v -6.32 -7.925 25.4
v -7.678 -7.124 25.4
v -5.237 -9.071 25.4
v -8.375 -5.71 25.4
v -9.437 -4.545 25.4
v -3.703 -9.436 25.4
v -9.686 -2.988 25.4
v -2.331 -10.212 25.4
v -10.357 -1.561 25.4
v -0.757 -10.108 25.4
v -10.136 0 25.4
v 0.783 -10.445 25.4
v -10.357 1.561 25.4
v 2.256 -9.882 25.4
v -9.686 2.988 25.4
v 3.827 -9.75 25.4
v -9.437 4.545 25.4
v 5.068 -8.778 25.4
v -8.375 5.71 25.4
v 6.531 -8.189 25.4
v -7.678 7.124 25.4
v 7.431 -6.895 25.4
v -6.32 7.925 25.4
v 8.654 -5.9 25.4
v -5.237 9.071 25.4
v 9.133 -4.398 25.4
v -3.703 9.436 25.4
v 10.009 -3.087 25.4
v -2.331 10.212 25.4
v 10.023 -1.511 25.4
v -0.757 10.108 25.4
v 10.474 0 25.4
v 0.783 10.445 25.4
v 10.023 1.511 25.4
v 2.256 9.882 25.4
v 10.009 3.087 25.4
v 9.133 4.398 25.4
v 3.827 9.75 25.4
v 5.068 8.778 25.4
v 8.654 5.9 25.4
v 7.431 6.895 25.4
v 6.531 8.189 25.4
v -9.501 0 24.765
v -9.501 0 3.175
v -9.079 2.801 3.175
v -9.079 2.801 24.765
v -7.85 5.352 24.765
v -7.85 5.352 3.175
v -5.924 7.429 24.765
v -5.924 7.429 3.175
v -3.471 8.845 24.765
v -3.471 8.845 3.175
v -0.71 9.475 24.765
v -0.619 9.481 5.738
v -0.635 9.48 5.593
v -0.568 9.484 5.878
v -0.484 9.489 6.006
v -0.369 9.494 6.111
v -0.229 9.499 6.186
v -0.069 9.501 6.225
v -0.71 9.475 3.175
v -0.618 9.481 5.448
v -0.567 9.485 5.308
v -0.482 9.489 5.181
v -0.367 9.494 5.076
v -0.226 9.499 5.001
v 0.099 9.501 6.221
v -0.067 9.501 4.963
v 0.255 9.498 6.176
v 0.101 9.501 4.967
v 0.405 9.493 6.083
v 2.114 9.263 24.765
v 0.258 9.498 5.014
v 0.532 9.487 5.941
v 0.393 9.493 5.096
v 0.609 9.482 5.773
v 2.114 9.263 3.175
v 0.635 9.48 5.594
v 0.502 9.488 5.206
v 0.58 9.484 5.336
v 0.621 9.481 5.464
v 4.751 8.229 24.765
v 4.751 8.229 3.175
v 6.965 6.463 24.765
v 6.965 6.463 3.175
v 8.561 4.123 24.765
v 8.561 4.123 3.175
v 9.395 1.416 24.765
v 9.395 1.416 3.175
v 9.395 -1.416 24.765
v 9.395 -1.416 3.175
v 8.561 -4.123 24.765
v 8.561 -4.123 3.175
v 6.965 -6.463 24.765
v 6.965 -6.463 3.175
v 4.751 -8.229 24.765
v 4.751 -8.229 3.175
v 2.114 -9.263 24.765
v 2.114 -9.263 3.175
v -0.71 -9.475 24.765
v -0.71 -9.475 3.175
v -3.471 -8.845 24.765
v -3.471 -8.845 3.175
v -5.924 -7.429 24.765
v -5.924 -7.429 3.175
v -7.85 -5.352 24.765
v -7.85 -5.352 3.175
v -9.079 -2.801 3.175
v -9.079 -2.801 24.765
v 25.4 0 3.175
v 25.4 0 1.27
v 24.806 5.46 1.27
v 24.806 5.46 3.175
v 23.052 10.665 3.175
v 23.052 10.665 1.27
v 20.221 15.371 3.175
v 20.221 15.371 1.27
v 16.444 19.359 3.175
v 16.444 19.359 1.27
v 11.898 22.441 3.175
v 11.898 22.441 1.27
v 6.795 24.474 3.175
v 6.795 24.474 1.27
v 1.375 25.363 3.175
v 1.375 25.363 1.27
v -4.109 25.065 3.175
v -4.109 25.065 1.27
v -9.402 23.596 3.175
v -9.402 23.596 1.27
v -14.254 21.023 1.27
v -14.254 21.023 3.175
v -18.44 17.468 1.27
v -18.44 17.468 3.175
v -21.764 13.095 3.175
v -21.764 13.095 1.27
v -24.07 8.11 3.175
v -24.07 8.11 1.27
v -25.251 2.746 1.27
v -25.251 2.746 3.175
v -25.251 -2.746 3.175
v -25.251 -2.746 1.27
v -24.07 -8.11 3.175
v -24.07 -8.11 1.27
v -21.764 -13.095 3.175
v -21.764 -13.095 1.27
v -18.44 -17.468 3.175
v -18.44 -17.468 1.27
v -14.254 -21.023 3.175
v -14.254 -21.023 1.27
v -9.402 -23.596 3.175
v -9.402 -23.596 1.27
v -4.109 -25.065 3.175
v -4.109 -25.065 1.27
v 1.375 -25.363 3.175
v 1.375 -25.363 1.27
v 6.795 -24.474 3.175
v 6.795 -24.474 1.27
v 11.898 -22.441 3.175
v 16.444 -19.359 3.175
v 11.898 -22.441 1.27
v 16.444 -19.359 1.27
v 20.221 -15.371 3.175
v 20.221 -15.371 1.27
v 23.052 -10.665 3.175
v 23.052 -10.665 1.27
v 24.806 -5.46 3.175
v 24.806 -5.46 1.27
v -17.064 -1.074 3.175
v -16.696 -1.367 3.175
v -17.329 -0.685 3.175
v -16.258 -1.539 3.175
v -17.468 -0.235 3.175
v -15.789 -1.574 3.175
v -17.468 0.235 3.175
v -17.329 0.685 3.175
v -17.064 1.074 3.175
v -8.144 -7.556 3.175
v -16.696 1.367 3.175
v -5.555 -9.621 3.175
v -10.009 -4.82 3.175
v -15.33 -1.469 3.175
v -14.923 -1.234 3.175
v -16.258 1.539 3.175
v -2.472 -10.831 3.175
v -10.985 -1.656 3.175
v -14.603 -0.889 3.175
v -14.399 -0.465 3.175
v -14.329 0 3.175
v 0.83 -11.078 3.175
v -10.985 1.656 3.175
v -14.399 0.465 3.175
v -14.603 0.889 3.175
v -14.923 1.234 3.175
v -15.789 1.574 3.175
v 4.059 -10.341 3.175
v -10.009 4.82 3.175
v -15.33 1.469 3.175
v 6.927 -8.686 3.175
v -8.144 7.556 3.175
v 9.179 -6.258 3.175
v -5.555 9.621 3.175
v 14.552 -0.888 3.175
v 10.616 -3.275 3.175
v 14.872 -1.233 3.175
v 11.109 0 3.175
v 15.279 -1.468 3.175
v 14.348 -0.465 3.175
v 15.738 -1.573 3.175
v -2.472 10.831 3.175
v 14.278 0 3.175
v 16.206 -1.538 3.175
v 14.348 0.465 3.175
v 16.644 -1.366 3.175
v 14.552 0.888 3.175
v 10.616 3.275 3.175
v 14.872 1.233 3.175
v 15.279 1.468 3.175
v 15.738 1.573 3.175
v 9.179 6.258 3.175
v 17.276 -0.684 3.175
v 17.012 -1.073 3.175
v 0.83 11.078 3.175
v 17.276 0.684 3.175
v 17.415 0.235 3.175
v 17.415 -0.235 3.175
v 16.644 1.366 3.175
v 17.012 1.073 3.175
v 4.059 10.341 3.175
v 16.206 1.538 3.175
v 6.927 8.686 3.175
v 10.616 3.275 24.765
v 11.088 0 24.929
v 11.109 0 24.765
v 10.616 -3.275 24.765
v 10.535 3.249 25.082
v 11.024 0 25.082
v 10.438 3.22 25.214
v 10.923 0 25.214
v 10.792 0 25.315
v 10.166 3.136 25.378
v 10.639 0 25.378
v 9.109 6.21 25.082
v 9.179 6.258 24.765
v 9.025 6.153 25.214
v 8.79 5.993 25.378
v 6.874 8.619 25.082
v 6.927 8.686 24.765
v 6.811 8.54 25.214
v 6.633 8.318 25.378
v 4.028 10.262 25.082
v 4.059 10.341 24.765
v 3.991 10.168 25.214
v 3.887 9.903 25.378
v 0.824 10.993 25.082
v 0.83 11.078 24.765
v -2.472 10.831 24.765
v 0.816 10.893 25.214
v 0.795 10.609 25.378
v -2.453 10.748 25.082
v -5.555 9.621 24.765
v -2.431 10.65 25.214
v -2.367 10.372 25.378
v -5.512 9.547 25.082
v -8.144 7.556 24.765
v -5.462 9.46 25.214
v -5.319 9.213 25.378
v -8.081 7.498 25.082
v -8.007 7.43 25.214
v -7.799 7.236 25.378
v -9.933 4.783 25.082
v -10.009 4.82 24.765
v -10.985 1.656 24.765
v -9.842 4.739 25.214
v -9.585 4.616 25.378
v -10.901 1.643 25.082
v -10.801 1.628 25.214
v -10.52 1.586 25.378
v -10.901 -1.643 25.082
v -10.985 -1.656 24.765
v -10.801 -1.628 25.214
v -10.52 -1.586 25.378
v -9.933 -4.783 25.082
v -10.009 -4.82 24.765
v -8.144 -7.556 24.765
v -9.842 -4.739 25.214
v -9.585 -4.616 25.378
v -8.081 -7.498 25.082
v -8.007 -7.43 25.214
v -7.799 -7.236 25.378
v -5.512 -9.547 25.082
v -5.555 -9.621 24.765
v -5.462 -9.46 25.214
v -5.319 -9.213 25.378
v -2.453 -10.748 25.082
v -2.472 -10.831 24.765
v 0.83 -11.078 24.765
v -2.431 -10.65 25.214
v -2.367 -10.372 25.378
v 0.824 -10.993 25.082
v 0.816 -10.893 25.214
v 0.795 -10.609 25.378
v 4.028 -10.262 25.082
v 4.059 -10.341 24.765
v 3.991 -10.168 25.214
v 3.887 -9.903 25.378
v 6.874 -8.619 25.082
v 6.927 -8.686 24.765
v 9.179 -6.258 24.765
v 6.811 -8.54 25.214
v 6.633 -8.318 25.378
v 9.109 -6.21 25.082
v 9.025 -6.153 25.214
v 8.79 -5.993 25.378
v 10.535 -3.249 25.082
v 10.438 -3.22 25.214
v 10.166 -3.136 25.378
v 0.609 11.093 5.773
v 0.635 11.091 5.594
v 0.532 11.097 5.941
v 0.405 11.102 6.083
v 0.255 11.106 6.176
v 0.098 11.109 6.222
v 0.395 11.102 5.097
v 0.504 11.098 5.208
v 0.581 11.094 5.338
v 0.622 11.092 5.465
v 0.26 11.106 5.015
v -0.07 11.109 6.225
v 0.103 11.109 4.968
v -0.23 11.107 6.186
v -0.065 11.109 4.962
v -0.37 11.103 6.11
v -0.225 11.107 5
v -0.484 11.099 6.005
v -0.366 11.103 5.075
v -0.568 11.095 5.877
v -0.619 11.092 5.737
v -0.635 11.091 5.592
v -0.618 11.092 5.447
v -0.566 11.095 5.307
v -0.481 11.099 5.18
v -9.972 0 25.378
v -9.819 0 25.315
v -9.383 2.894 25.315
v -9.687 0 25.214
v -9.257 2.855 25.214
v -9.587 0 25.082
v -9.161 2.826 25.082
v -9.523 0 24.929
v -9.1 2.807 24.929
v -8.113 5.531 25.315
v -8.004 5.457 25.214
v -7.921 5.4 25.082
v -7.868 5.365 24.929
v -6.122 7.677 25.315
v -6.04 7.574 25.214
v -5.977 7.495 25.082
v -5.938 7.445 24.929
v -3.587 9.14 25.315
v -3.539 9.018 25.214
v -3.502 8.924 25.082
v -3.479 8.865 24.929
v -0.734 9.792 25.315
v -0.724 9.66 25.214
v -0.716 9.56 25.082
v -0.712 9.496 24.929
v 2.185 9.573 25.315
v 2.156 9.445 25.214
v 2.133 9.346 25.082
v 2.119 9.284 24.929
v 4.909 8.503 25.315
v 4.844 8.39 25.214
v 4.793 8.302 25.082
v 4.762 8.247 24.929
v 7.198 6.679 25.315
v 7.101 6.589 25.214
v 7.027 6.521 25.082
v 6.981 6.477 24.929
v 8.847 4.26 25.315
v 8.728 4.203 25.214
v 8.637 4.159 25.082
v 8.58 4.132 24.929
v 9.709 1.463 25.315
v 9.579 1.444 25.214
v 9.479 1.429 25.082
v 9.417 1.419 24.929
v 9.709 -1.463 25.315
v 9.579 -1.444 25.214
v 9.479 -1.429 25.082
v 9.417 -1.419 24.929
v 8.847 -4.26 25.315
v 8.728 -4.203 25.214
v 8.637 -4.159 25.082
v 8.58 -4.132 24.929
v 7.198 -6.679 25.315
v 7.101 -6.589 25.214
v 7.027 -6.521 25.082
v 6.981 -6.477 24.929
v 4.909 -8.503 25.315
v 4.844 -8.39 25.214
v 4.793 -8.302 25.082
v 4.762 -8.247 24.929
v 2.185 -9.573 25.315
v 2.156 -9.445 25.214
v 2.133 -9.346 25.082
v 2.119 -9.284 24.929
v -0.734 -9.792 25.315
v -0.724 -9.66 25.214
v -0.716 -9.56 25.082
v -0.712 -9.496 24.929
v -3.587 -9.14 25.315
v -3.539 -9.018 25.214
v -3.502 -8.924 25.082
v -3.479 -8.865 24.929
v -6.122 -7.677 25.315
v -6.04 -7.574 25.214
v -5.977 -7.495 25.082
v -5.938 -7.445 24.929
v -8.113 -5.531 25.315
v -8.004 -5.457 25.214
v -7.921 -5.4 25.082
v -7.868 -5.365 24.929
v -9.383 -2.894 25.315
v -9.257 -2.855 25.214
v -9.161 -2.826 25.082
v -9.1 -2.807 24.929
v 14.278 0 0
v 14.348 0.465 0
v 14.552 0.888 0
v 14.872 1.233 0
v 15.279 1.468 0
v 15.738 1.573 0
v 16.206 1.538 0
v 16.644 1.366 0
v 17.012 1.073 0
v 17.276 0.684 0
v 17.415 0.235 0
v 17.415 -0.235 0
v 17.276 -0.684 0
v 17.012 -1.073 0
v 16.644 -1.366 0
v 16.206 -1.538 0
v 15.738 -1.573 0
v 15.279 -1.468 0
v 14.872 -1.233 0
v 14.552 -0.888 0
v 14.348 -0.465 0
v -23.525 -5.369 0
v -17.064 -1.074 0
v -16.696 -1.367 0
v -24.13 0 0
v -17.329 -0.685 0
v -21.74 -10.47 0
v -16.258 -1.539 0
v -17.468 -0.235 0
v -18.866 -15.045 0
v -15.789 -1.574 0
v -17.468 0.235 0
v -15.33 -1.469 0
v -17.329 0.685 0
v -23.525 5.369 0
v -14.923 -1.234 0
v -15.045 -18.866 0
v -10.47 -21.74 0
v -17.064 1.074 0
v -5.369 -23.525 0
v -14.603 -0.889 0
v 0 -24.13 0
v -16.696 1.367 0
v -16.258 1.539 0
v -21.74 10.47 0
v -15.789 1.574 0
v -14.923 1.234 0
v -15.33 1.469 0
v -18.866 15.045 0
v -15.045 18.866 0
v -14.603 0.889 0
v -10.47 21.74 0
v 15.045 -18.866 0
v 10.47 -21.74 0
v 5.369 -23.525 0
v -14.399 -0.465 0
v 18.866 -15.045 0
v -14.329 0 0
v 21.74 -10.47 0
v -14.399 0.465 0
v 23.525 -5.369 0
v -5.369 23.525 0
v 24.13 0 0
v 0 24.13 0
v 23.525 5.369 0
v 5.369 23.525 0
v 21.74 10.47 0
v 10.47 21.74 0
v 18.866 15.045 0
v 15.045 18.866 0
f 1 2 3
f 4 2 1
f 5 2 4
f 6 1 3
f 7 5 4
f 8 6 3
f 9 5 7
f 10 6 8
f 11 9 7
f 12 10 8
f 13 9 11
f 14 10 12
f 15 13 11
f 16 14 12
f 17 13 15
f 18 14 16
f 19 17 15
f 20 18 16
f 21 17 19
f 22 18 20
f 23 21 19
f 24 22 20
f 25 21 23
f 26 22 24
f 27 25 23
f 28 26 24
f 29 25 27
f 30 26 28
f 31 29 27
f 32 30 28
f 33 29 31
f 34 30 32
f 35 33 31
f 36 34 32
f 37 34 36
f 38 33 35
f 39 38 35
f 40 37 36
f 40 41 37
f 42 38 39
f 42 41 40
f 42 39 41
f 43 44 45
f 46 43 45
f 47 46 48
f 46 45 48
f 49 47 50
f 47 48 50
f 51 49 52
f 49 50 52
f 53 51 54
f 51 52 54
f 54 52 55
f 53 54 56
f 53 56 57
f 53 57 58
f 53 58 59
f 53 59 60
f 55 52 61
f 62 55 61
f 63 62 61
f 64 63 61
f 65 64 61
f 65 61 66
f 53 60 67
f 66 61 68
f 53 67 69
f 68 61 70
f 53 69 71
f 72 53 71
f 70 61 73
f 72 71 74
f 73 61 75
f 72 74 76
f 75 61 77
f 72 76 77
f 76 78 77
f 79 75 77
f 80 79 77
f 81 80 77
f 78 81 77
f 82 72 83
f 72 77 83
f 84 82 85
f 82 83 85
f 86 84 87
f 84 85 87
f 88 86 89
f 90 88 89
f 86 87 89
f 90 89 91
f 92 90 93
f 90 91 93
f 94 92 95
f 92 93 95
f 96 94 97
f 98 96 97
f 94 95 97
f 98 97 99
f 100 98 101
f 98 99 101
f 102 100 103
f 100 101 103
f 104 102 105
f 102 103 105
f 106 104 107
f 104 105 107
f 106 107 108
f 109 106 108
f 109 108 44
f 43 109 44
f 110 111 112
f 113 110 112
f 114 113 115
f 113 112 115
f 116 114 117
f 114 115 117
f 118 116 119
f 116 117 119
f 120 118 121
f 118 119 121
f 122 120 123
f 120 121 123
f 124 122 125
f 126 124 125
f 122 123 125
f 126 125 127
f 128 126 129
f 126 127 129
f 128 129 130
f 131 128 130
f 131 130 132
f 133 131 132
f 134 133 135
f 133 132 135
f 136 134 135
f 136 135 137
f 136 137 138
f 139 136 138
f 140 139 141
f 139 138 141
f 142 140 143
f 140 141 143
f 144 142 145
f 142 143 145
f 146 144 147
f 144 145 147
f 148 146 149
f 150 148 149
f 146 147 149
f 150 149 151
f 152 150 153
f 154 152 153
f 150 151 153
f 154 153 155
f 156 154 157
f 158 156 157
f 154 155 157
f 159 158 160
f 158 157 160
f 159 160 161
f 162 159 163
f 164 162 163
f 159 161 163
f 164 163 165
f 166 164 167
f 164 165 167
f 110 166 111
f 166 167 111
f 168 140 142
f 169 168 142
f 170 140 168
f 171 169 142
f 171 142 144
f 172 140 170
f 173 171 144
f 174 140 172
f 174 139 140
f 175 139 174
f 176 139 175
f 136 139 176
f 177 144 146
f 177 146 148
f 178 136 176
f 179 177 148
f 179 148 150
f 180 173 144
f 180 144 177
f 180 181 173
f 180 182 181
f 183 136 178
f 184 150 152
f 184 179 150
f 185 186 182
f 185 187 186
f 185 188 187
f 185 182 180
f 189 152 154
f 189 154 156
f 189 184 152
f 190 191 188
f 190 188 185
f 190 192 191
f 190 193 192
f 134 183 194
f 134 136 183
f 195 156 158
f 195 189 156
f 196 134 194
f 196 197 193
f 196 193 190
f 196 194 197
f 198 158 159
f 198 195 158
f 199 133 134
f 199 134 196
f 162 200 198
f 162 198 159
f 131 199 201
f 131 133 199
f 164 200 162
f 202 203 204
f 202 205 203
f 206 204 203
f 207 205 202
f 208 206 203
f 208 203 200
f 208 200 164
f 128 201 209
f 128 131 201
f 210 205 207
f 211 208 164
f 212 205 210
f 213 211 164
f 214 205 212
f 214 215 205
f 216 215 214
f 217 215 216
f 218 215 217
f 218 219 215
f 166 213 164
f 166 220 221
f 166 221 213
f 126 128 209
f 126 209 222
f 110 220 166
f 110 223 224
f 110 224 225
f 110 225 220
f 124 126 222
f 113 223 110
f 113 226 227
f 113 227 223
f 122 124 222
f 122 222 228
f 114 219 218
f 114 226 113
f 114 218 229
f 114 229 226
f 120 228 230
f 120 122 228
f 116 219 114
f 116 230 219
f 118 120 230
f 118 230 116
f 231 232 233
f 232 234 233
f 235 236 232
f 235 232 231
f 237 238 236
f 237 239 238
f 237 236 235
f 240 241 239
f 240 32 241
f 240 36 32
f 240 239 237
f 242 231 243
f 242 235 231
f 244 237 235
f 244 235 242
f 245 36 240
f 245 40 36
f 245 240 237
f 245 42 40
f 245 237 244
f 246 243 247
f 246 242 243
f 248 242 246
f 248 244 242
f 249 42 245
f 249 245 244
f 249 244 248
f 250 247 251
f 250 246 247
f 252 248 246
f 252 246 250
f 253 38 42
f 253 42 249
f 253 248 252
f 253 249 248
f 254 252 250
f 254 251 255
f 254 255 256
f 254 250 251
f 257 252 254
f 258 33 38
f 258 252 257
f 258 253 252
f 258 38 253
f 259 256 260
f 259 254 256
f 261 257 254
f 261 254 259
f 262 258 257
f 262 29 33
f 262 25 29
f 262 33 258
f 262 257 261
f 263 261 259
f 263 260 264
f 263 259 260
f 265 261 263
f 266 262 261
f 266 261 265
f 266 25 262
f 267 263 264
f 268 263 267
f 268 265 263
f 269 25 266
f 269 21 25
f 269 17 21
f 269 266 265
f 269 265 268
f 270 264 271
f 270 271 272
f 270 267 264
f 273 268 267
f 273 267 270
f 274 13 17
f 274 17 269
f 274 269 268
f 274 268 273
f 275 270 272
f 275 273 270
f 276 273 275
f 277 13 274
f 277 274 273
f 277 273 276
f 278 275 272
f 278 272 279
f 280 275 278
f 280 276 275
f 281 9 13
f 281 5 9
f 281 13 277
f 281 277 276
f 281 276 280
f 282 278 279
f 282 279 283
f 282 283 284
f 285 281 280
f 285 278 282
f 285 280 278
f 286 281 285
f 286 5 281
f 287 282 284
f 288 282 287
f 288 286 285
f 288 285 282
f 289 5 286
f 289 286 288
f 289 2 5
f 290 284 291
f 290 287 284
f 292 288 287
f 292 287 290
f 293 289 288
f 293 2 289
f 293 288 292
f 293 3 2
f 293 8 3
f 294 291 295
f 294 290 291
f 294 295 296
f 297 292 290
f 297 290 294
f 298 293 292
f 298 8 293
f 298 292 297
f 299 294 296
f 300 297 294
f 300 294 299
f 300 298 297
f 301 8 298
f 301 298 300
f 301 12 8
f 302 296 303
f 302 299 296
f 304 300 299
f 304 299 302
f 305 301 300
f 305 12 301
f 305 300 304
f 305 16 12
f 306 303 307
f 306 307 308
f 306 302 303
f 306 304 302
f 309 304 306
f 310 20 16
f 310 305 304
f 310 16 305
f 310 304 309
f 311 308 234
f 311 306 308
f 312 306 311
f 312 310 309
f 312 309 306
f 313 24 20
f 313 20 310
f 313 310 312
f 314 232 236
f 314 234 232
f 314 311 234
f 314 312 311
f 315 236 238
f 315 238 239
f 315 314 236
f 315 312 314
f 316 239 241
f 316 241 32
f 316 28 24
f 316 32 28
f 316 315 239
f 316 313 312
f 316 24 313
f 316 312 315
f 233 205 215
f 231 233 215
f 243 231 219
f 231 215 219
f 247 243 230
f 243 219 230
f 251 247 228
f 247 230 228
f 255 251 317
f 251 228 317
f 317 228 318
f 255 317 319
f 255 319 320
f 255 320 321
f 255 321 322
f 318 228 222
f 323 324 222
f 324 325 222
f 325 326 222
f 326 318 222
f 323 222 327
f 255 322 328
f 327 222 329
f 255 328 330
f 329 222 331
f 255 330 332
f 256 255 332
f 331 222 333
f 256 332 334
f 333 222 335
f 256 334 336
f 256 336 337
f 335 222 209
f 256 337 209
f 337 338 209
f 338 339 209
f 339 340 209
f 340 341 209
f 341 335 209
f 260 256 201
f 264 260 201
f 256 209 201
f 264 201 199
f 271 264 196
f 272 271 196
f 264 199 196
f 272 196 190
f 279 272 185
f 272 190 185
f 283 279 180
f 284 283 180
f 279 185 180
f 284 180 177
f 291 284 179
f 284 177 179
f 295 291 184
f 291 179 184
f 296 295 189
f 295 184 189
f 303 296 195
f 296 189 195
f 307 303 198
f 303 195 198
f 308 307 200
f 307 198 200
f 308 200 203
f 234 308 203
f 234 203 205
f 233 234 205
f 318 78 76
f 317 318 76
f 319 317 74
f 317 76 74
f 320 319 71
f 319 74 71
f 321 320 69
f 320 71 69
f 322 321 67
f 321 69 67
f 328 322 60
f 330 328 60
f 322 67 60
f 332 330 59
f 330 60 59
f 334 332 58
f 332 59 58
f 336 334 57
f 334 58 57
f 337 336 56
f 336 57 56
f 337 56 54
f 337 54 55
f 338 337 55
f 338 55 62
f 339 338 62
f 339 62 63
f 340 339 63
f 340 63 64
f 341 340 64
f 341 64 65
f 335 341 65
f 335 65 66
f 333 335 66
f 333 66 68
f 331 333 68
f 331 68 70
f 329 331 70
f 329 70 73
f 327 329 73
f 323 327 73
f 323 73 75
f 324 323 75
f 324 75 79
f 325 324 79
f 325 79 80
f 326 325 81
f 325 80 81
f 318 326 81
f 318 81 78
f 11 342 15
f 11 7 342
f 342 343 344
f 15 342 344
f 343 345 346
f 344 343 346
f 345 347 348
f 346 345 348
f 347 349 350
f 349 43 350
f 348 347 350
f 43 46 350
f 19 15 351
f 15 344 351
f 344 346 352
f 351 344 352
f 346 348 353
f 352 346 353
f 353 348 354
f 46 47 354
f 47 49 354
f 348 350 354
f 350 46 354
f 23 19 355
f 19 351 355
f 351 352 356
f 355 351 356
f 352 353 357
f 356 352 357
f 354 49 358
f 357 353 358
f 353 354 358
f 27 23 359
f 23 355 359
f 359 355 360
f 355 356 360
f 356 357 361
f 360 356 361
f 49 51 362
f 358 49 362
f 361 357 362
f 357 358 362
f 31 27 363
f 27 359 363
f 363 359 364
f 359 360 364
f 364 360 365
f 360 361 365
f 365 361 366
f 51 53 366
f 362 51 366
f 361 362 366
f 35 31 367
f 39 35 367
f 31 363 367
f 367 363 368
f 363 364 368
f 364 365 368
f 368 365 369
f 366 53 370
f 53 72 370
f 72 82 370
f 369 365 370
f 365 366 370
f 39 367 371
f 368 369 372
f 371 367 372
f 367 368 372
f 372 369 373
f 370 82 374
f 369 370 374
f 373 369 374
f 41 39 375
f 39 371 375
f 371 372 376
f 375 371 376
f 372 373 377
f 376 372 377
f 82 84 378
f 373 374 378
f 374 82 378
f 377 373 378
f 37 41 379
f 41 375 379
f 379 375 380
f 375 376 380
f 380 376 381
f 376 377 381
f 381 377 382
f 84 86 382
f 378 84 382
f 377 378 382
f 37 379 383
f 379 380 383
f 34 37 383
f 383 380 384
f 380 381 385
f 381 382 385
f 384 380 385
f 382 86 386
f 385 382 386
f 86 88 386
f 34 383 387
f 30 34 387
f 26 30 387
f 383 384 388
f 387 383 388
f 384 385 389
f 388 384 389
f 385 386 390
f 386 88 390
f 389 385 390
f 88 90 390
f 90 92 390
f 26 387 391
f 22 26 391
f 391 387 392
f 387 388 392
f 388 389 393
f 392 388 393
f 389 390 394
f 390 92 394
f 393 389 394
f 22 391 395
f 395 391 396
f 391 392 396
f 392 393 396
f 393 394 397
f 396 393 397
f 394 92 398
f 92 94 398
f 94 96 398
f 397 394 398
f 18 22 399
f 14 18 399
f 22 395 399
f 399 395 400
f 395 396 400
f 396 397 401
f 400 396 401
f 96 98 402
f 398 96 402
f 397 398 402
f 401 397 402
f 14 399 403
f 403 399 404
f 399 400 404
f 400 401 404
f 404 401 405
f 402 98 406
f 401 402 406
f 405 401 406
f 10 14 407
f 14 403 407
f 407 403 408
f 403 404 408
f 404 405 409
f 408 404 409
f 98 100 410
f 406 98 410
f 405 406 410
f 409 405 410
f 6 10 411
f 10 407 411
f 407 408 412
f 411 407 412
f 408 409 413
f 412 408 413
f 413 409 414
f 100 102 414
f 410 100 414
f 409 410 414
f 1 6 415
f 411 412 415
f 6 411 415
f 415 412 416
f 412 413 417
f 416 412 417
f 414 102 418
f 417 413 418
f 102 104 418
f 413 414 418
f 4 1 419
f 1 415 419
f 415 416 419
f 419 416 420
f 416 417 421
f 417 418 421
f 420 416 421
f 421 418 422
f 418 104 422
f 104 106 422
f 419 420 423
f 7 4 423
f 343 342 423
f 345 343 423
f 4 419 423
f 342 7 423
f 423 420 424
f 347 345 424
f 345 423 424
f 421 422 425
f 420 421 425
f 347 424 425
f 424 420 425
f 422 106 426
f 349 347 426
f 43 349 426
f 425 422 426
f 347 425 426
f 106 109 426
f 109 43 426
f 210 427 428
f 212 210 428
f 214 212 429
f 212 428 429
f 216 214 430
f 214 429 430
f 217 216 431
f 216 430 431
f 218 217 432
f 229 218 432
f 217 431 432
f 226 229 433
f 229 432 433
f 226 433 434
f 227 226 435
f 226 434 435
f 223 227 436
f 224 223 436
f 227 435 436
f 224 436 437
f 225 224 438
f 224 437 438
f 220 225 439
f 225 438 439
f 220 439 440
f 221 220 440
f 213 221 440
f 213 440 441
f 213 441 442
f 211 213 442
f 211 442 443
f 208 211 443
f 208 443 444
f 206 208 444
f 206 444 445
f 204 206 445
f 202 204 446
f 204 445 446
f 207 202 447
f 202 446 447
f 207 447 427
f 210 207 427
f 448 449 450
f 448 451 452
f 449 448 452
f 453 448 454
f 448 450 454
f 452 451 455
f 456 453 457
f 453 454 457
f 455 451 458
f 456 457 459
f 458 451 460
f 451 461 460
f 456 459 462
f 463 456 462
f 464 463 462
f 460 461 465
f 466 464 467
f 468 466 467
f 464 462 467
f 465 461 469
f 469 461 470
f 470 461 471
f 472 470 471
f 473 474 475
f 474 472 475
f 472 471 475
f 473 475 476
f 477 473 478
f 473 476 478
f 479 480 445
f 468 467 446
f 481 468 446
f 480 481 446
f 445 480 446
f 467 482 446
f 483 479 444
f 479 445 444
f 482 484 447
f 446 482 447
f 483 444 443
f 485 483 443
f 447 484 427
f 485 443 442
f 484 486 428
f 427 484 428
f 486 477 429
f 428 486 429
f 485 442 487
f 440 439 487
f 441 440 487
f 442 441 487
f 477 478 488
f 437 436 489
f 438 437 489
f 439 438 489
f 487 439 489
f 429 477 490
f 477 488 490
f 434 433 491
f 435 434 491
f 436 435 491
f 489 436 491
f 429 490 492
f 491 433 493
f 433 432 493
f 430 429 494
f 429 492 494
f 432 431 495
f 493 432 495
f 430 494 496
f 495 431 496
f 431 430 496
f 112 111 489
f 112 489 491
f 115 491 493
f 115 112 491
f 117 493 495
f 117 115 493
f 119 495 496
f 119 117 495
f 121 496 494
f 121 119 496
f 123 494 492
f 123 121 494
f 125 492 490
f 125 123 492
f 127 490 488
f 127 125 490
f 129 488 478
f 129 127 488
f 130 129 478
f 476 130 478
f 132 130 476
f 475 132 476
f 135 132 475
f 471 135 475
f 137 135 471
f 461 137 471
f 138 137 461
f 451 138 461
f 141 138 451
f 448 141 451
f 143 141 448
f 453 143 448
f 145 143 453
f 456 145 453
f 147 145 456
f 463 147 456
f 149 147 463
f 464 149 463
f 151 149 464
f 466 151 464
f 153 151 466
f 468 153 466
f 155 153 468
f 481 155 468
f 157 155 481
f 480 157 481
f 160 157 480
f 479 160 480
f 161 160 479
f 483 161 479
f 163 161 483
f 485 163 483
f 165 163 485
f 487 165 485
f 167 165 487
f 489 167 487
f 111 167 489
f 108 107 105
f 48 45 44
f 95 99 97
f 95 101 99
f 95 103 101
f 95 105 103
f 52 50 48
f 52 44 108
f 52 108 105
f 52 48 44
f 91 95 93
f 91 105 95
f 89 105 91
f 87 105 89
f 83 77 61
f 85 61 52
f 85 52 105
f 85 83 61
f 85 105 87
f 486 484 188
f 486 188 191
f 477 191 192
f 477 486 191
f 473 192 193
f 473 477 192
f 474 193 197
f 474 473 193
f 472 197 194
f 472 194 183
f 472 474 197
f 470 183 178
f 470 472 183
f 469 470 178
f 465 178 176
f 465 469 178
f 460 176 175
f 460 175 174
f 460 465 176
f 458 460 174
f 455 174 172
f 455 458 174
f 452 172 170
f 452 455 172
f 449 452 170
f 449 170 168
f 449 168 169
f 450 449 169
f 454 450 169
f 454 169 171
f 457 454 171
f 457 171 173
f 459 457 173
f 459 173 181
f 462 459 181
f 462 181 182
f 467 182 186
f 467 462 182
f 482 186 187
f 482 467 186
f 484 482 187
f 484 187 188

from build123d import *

# Parameters (mm, degrees)
F0_R     = 25.4
F0_R_2   = 1.5785092345
F1_DEPTH = 3.175
F2_DEPTH = 25.4
F3_R     = 0.635
F4_DEPTH = 25.4
F5_SIZE  = 1.27
F6_R     = 0.635


with BuildPart() as f1:
    # F0 (on Top) → F1 (new body)
    with BuildSketch(Plane.XY):
        Circle(F0_R)
        with Locations((-15.9070281119, 0)):
            Circle(F0_R_2, mode=Mode.SUBTRACT)
        with BuildLine():
            ThreePointArc((-11.1093761475, 0), (0, 11.1093761475), (11.1093761475, 0))
            ThreePointArc((11.1093761475, 0), (0, -11.1093761475), (-11.1093761475, 0))
        make_face(mode=Mode.SUBTRACT)
        with BuildLine():
            ThreePointArc((17.4326761663, 0), (15.8555379837, -1.5771381826), (14.2783998011, 0))
            ThreePointArc((14.2783998011, 0), (15.8555379837, 1.5771381826), (17.4326761663, 0))
        make_face(mode=Mode.SUBTRACT)
        with BuildLine():
            Line((0, 0), (9.5014704661, 0))
            ThreePointArc((9.5014704661, 0), (0, 9.5014704661), (-9.5014704661, 0))
            Line((-9.5014704661, 0), (0, 0))
        make_face()
        with BuildLine():
            ThreePointArc((-9.5014704661, 0), (0, -9.5014704661), (9.5014704661, 0))
            Line((9.5014704661, 0), (0, 0))
            Line((0, 0), (-9.5014704661, 0))
        make_face()
        with BuildLine():
            ThreePointArc((-9.5014704661, 0), (0, 9.5014704661), (9.5014704661, 0))
            Line((9.5014704661, 0), (11.1093761475, 0))
            ThreePointArc((11.1093761475, 0), (0, 11.1093761475), (-11.1093761475, 0))
            Line((-11.1093761475, 0), (-9.5014704661, 0))
        make_face()
        with BuildLine():
            Line((11.1093761475, 0), (9.5014704661, 0))
            ThreePointArc((9.5014704661, 0), (0, -9.5014704661), (-9.5014704661, 0))
            Line((-9.5014704661, 0), (-11.1093761475, 0))
            ThreePointArc((-11.1093761475, 0), (0, -11.1093761475), (11.1093761475, 0))
        make_face()
    extrude(amount=F1_DEPTH)

    # F0 (on Top) → F2 (join)
    with BuildSketch(Plane.XY):
        with BuildLine():
            Line((11.1093761475, 0), (9.5014704661, 0))
            ThreePointArc((9.5014704661, 0), (0, -9.5014704661), (-9.5014704661, 0))
            Line((-9.5014704661, 0), (-11.1093761475, 0))
            ThreePointArc((-11.1093761475, 0), (0, -11.1093761475), (11.1093761475, 0))
        make_face()
        with BuildLine():
            ThreePointArc((-9.5014704661, 0), (0, 9.5014704661), (9.5014704661, 0))
            Line((9.5014704661, 0), (11.1093761475, 0))
            ThreePointArc((11.1093761475, 0), (0, 11.1093761475), (-11.1093761475, 0))
            Line((-11.1093761475, 0), (-9.5014704661, 0))
        make_face()
    extrude(amount=F2_DEPTH)

    # F3 (on Front) → F4 (cut)
    with BuildSketch(Plane.XZ):
        with Locations((0, 5.5941580795)):
            Circle(F3_R)
    extrude(amount=-F4_DEPTH, mode=Mode.SUBTRACT)

    # F5
    f5_edges = [f1.edges().sort_by_distance(p)[0] for p in [
        (-25.4, 0, 0),
    ]]
    chamfer(f5_edges, length=F5_SIZE)

    # F6
    f6_edges = [f1.edges().sort_by_distance(p)[0] for p in [
        (-11.109376, 0, 25.4),
        (9.50147, 0, 25.4),
    ]]
    fillet(f6_edges, radius=F6_R)


solid = f1.part
